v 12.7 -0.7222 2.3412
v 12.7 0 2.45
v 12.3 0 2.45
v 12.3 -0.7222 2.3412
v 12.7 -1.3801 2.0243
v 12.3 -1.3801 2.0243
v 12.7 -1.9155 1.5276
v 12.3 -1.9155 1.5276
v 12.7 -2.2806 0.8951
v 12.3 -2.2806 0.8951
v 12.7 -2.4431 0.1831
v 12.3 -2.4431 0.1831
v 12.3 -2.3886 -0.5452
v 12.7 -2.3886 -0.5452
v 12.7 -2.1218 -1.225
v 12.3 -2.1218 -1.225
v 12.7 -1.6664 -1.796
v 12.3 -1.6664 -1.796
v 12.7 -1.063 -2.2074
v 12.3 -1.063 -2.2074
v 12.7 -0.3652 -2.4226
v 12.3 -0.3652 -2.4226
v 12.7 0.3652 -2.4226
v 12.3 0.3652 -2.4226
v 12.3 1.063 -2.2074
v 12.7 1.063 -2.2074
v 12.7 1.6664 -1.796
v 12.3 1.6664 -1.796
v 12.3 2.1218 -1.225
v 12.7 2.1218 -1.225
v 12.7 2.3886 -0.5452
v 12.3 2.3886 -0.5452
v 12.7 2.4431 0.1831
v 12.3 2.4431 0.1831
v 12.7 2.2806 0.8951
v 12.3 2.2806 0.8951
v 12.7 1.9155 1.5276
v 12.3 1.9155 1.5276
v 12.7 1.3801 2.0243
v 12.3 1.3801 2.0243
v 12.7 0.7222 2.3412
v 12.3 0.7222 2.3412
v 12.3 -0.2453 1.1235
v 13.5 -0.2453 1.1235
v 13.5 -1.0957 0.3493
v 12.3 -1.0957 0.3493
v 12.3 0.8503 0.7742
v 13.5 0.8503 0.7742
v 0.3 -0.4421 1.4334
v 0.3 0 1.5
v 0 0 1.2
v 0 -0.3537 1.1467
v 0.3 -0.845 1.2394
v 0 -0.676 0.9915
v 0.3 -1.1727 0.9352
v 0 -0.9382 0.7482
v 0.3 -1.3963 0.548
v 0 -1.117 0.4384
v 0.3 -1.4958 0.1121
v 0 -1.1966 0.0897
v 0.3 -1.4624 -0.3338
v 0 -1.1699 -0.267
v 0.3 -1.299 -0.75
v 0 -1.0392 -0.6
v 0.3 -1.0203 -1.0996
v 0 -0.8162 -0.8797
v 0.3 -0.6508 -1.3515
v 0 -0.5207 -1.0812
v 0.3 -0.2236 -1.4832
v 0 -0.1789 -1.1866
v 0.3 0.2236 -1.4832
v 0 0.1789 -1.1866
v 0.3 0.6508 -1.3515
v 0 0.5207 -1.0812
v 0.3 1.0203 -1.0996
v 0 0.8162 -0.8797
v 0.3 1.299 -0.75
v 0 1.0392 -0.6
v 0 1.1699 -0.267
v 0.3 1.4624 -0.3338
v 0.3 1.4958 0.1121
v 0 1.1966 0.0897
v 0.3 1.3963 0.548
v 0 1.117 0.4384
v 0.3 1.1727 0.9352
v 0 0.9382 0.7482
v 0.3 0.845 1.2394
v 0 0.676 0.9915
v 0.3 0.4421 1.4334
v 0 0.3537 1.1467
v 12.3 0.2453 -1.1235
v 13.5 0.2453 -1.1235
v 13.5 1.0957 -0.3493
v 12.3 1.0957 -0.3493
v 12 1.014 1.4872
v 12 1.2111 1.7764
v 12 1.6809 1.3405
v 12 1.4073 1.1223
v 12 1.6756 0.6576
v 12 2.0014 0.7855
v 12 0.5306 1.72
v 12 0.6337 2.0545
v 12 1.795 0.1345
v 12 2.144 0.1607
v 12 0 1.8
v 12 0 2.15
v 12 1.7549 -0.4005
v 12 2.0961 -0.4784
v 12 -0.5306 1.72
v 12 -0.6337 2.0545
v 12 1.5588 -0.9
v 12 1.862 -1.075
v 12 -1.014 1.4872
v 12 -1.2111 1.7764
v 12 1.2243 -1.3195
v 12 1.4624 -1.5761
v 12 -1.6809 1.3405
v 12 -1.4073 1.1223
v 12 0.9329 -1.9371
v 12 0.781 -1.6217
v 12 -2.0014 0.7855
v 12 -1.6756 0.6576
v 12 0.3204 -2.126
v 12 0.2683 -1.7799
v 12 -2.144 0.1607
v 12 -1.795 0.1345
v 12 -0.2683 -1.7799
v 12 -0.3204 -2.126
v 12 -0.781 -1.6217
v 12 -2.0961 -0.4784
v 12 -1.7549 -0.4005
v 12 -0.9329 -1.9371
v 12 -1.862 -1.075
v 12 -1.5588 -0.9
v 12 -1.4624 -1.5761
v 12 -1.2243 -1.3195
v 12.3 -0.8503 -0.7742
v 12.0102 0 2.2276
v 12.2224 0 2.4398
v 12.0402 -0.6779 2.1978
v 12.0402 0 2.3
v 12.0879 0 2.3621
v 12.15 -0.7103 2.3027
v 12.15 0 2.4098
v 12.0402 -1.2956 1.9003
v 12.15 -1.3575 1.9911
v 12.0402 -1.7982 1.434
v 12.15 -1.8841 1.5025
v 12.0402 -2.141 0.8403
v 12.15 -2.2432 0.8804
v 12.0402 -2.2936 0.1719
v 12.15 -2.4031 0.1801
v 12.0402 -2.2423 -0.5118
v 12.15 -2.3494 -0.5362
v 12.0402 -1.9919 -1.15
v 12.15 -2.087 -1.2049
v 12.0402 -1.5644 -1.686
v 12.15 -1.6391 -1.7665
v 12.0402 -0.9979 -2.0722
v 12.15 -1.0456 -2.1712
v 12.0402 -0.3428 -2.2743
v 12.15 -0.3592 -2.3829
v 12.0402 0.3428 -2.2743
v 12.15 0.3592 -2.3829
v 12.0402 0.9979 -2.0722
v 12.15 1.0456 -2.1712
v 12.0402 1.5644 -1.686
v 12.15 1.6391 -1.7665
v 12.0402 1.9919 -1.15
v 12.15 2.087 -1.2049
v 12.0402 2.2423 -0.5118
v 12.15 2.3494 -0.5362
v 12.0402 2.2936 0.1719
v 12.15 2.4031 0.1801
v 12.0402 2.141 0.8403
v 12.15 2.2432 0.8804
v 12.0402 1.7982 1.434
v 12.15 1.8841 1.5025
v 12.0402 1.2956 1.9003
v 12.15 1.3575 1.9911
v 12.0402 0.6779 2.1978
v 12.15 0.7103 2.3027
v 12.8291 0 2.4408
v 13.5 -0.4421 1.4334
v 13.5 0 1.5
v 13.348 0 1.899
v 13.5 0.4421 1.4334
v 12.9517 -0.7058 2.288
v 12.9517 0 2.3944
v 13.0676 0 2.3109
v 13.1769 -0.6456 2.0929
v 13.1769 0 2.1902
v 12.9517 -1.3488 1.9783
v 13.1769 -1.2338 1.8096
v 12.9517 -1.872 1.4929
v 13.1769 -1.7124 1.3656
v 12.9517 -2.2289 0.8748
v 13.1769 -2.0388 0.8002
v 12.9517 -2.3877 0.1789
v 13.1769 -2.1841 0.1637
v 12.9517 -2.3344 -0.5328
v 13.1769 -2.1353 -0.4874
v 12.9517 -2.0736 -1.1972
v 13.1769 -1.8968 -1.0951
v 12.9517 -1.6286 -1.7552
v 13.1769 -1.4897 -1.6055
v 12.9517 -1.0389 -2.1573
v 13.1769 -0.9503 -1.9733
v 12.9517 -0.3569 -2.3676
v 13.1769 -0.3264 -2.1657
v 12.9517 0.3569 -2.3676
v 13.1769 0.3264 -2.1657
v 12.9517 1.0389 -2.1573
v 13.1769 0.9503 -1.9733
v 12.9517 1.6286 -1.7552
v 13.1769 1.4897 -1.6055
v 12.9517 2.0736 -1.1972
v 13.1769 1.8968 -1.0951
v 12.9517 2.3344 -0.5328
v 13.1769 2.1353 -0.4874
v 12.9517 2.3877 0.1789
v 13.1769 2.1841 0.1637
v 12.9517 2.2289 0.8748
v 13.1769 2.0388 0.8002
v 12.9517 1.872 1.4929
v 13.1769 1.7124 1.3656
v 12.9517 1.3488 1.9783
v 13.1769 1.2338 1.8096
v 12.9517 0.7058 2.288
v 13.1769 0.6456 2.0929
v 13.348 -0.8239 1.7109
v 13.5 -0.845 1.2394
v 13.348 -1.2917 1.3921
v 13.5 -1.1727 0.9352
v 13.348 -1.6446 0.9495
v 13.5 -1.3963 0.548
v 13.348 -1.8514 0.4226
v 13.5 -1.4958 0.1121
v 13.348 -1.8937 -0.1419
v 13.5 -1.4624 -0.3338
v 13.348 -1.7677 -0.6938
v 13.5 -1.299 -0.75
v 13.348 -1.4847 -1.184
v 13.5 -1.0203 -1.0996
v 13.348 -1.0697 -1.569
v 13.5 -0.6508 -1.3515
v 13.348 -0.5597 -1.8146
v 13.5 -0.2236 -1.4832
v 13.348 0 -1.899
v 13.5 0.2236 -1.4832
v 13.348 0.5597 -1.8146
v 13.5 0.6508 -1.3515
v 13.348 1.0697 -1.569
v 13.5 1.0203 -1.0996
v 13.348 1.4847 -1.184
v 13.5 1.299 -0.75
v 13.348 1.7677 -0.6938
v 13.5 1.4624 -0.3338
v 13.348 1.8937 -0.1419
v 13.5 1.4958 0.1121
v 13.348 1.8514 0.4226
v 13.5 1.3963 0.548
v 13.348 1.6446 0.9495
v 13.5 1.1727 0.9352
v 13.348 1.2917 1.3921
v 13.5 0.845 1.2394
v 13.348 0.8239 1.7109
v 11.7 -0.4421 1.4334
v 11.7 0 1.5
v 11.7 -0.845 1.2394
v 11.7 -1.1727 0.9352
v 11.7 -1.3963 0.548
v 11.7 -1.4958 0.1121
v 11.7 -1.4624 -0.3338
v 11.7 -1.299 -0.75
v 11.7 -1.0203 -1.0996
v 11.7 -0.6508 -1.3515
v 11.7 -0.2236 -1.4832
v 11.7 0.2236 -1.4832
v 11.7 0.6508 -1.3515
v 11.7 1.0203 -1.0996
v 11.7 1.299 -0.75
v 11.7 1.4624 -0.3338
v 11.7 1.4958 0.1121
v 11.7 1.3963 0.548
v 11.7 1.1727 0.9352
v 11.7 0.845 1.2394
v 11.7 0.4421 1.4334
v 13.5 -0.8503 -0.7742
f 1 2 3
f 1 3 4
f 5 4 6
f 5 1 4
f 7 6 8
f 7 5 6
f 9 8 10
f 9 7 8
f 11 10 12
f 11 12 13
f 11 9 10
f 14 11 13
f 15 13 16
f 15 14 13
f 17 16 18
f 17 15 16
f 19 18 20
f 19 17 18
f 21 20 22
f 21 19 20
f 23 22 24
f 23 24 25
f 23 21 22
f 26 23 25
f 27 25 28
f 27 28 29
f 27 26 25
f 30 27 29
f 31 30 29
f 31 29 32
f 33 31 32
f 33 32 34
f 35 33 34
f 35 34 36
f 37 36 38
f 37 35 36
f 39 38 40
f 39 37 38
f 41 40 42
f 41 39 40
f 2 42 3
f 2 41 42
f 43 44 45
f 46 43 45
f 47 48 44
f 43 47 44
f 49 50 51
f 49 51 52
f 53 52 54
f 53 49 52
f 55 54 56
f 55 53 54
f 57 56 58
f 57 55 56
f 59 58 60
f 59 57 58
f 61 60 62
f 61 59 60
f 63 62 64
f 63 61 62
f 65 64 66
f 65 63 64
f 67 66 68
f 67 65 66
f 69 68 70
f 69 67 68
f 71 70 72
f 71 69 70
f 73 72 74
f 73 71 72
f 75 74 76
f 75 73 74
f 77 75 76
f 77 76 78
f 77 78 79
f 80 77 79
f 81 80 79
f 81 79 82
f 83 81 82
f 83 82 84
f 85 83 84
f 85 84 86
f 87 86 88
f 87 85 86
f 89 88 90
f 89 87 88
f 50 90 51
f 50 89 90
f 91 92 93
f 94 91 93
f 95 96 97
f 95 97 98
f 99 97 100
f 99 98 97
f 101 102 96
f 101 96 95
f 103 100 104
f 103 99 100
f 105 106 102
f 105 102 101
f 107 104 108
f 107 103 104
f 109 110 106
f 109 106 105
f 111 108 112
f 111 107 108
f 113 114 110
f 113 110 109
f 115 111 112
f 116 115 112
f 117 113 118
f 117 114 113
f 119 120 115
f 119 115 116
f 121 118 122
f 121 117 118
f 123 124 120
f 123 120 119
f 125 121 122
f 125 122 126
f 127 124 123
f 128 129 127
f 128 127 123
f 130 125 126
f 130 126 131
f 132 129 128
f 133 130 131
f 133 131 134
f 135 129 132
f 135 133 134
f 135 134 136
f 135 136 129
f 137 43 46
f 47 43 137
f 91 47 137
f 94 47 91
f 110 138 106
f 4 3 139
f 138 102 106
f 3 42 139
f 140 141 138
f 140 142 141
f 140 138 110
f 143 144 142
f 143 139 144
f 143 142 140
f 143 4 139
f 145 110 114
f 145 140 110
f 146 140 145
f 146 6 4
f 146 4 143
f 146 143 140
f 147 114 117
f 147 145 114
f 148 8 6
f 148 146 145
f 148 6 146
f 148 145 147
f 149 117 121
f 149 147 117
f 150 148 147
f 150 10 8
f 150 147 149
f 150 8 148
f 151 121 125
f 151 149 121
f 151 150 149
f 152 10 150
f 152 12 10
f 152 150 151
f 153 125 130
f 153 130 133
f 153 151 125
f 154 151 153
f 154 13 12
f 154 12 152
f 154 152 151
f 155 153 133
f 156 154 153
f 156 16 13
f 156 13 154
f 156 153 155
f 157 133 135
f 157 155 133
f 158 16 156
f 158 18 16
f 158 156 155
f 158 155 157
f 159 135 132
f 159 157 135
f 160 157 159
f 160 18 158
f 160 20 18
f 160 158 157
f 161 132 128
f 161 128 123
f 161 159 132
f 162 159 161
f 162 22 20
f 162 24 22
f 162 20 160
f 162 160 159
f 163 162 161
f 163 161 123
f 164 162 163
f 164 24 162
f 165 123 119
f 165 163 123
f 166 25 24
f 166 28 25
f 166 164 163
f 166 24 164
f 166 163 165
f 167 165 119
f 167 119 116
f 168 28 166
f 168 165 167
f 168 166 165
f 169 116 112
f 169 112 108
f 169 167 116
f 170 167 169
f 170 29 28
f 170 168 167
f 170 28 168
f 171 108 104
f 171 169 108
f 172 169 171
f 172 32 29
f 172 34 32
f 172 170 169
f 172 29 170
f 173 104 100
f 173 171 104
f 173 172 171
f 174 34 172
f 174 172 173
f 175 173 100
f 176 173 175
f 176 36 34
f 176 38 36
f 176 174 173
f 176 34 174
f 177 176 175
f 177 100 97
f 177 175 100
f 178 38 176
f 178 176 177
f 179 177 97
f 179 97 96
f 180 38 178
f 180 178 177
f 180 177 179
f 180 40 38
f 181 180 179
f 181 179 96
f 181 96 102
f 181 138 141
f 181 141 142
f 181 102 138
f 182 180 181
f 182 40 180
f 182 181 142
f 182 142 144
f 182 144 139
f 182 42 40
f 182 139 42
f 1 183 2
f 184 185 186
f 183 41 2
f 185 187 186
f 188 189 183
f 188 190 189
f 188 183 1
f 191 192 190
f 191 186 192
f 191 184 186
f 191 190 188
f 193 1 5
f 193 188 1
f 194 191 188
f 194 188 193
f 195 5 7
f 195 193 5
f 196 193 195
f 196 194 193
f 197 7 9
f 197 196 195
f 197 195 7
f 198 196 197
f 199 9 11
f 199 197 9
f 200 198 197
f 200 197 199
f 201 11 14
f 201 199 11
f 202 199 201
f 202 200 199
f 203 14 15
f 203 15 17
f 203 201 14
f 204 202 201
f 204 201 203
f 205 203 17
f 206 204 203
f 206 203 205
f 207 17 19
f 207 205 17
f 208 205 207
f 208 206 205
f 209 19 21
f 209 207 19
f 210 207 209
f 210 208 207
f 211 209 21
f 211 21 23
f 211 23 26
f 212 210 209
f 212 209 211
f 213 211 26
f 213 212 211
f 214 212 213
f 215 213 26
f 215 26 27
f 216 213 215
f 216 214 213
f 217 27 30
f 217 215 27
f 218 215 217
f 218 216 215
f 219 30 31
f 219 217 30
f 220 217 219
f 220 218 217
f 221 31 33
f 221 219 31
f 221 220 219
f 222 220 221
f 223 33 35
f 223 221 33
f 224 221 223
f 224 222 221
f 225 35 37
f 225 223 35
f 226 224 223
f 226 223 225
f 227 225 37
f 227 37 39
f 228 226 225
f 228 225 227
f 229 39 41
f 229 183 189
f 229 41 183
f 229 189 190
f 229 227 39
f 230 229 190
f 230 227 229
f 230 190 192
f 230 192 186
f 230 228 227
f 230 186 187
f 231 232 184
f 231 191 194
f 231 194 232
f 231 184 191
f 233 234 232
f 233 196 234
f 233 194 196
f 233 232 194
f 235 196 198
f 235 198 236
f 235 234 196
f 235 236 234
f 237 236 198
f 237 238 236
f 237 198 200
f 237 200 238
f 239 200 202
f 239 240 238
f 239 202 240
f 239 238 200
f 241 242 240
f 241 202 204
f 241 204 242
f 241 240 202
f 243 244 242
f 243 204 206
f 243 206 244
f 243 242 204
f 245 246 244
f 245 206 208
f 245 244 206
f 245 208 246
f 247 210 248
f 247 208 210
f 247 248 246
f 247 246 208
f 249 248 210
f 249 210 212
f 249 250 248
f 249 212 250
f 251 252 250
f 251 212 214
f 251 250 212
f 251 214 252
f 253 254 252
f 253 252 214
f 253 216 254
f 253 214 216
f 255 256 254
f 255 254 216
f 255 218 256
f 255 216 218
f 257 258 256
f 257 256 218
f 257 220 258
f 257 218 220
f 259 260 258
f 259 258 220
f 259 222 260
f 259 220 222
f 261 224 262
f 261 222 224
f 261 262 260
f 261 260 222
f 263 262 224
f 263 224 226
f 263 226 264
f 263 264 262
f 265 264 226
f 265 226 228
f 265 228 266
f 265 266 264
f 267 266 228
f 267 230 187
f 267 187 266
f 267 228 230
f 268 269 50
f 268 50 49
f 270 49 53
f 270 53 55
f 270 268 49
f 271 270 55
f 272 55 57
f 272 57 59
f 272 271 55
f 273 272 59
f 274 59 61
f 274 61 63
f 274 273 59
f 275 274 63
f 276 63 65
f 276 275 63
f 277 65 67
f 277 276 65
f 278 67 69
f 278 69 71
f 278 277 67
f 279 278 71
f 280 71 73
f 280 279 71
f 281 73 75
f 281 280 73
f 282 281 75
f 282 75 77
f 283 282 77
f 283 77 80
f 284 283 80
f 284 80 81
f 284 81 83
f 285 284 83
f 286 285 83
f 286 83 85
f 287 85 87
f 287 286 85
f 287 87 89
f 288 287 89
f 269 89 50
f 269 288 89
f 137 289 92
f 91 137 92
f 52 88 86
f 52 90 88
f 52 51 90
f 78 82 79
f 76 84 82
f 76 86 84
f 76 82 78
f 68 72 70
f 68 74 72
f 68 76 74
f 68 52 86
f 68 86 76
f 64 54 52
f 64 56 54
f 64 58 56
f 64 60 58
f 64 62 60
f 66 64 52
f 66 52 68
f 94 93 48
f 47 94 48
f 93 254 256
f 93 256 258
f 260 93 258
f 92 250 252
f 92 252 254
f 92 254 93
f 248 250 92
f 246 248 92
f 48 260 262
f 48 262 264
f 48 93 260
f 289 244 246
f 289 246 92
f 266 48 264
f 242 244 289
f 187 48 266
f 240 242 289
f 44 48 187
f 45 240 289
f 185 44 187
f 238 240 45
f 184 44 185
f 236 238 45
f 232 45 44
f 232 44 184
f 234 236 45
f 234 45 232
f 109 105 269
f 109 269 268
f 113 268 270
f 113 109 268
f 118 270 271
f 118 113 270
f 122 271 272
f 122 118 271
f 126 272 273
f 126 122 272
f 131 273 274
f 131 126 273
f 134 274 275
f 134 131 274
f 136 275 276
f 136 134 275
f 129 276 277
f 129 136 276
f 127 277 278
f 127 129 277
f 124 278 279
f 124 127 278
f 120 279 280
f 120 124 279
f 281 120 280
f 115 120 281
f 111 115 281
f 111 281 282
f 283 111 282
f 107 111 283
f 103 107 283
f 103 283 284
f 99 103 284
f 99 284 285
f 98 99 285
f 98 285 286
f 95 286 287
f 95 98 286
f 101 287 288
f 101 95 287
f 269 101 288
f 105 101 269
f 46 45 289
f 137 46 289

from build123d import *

# Parameters (mm, degrees)
CUT_EXTRUDE1_DEPTH = 1.2
CHAMFER1_SIZE      = 0.3
FILLET1_R          = 0.3


with BuildPart() as part:
    # Sketch1 → Revolve1 (revolve)
    with BuildSketch(Plane(origin=(0, 0, 0), x_dir=(1, 0, 0), z_dir=(0, 1, 0)), mode=Mode.PRIVATE) as revolve1_sk:
        with BuildLine():
            Line((0, 0), (0, 1.5))
            Line((0, 1.5), (12, 1.5))
            Line((12, 1.5), (12, 2.45))
            Line((12, 2.45), (12.7, 2.45))
            add(Edge.make_bspline(
                [(12.7, 2.45), (13.190442748, 2.484618279), (13.5, 1.5)],
                knots=[0, 0, 0, 0.615019669, 0.615019669, 0.615019669], degree=2))
            Line((13.5, 1.5), (13.5, 0))
            Line((13.5, 0), (0, 0))
        make_face()
    revolve(revolve1_sk.sketch.rotate(Axis((-60.710951108, 0, 0), (1, 0, 0)), 180), axis=Axis((-60.710951108, 0, 0), (1, 0, 0)))

    # Sketch2 → Cut-Extrude1 (cut)
    with BuildSketch(Plane(origin=(13.5, 0, 0), x_dir=(0, 0, -1), z_dir=(1, 0, 0))):
        Polygon((0.349309187, 1.095665593), (-0.774219644, 0.850343426), (-1.123528831, -0.245322167), (-0.349309187, -1.095665593), (0.774219644, -0.850343426), (1.123528831, 0.245322167), align=None)
    extrude(amount=-CUT_EXTRUDE1_DEPTH, mode=Mode.SUBTRACT)

    # Chamfer1
    chamfer1_edges = [part.edges().sort_by_distance(p)[0] for p in [
        (0, 0, -1.5),
        (12, 0, -1.5),
    ]]
    chamfer(chamfer1_edges, length=CHAMFER1_SIZE)

    # Fillet1
    fillet1_edges = [part.edges().sort_by_distance(p)[0] for p in [
        (12, 0, -2.45),
    ]]
    fillet(fillet1_edges, radius=FILLET1_R)


solid = part.part
